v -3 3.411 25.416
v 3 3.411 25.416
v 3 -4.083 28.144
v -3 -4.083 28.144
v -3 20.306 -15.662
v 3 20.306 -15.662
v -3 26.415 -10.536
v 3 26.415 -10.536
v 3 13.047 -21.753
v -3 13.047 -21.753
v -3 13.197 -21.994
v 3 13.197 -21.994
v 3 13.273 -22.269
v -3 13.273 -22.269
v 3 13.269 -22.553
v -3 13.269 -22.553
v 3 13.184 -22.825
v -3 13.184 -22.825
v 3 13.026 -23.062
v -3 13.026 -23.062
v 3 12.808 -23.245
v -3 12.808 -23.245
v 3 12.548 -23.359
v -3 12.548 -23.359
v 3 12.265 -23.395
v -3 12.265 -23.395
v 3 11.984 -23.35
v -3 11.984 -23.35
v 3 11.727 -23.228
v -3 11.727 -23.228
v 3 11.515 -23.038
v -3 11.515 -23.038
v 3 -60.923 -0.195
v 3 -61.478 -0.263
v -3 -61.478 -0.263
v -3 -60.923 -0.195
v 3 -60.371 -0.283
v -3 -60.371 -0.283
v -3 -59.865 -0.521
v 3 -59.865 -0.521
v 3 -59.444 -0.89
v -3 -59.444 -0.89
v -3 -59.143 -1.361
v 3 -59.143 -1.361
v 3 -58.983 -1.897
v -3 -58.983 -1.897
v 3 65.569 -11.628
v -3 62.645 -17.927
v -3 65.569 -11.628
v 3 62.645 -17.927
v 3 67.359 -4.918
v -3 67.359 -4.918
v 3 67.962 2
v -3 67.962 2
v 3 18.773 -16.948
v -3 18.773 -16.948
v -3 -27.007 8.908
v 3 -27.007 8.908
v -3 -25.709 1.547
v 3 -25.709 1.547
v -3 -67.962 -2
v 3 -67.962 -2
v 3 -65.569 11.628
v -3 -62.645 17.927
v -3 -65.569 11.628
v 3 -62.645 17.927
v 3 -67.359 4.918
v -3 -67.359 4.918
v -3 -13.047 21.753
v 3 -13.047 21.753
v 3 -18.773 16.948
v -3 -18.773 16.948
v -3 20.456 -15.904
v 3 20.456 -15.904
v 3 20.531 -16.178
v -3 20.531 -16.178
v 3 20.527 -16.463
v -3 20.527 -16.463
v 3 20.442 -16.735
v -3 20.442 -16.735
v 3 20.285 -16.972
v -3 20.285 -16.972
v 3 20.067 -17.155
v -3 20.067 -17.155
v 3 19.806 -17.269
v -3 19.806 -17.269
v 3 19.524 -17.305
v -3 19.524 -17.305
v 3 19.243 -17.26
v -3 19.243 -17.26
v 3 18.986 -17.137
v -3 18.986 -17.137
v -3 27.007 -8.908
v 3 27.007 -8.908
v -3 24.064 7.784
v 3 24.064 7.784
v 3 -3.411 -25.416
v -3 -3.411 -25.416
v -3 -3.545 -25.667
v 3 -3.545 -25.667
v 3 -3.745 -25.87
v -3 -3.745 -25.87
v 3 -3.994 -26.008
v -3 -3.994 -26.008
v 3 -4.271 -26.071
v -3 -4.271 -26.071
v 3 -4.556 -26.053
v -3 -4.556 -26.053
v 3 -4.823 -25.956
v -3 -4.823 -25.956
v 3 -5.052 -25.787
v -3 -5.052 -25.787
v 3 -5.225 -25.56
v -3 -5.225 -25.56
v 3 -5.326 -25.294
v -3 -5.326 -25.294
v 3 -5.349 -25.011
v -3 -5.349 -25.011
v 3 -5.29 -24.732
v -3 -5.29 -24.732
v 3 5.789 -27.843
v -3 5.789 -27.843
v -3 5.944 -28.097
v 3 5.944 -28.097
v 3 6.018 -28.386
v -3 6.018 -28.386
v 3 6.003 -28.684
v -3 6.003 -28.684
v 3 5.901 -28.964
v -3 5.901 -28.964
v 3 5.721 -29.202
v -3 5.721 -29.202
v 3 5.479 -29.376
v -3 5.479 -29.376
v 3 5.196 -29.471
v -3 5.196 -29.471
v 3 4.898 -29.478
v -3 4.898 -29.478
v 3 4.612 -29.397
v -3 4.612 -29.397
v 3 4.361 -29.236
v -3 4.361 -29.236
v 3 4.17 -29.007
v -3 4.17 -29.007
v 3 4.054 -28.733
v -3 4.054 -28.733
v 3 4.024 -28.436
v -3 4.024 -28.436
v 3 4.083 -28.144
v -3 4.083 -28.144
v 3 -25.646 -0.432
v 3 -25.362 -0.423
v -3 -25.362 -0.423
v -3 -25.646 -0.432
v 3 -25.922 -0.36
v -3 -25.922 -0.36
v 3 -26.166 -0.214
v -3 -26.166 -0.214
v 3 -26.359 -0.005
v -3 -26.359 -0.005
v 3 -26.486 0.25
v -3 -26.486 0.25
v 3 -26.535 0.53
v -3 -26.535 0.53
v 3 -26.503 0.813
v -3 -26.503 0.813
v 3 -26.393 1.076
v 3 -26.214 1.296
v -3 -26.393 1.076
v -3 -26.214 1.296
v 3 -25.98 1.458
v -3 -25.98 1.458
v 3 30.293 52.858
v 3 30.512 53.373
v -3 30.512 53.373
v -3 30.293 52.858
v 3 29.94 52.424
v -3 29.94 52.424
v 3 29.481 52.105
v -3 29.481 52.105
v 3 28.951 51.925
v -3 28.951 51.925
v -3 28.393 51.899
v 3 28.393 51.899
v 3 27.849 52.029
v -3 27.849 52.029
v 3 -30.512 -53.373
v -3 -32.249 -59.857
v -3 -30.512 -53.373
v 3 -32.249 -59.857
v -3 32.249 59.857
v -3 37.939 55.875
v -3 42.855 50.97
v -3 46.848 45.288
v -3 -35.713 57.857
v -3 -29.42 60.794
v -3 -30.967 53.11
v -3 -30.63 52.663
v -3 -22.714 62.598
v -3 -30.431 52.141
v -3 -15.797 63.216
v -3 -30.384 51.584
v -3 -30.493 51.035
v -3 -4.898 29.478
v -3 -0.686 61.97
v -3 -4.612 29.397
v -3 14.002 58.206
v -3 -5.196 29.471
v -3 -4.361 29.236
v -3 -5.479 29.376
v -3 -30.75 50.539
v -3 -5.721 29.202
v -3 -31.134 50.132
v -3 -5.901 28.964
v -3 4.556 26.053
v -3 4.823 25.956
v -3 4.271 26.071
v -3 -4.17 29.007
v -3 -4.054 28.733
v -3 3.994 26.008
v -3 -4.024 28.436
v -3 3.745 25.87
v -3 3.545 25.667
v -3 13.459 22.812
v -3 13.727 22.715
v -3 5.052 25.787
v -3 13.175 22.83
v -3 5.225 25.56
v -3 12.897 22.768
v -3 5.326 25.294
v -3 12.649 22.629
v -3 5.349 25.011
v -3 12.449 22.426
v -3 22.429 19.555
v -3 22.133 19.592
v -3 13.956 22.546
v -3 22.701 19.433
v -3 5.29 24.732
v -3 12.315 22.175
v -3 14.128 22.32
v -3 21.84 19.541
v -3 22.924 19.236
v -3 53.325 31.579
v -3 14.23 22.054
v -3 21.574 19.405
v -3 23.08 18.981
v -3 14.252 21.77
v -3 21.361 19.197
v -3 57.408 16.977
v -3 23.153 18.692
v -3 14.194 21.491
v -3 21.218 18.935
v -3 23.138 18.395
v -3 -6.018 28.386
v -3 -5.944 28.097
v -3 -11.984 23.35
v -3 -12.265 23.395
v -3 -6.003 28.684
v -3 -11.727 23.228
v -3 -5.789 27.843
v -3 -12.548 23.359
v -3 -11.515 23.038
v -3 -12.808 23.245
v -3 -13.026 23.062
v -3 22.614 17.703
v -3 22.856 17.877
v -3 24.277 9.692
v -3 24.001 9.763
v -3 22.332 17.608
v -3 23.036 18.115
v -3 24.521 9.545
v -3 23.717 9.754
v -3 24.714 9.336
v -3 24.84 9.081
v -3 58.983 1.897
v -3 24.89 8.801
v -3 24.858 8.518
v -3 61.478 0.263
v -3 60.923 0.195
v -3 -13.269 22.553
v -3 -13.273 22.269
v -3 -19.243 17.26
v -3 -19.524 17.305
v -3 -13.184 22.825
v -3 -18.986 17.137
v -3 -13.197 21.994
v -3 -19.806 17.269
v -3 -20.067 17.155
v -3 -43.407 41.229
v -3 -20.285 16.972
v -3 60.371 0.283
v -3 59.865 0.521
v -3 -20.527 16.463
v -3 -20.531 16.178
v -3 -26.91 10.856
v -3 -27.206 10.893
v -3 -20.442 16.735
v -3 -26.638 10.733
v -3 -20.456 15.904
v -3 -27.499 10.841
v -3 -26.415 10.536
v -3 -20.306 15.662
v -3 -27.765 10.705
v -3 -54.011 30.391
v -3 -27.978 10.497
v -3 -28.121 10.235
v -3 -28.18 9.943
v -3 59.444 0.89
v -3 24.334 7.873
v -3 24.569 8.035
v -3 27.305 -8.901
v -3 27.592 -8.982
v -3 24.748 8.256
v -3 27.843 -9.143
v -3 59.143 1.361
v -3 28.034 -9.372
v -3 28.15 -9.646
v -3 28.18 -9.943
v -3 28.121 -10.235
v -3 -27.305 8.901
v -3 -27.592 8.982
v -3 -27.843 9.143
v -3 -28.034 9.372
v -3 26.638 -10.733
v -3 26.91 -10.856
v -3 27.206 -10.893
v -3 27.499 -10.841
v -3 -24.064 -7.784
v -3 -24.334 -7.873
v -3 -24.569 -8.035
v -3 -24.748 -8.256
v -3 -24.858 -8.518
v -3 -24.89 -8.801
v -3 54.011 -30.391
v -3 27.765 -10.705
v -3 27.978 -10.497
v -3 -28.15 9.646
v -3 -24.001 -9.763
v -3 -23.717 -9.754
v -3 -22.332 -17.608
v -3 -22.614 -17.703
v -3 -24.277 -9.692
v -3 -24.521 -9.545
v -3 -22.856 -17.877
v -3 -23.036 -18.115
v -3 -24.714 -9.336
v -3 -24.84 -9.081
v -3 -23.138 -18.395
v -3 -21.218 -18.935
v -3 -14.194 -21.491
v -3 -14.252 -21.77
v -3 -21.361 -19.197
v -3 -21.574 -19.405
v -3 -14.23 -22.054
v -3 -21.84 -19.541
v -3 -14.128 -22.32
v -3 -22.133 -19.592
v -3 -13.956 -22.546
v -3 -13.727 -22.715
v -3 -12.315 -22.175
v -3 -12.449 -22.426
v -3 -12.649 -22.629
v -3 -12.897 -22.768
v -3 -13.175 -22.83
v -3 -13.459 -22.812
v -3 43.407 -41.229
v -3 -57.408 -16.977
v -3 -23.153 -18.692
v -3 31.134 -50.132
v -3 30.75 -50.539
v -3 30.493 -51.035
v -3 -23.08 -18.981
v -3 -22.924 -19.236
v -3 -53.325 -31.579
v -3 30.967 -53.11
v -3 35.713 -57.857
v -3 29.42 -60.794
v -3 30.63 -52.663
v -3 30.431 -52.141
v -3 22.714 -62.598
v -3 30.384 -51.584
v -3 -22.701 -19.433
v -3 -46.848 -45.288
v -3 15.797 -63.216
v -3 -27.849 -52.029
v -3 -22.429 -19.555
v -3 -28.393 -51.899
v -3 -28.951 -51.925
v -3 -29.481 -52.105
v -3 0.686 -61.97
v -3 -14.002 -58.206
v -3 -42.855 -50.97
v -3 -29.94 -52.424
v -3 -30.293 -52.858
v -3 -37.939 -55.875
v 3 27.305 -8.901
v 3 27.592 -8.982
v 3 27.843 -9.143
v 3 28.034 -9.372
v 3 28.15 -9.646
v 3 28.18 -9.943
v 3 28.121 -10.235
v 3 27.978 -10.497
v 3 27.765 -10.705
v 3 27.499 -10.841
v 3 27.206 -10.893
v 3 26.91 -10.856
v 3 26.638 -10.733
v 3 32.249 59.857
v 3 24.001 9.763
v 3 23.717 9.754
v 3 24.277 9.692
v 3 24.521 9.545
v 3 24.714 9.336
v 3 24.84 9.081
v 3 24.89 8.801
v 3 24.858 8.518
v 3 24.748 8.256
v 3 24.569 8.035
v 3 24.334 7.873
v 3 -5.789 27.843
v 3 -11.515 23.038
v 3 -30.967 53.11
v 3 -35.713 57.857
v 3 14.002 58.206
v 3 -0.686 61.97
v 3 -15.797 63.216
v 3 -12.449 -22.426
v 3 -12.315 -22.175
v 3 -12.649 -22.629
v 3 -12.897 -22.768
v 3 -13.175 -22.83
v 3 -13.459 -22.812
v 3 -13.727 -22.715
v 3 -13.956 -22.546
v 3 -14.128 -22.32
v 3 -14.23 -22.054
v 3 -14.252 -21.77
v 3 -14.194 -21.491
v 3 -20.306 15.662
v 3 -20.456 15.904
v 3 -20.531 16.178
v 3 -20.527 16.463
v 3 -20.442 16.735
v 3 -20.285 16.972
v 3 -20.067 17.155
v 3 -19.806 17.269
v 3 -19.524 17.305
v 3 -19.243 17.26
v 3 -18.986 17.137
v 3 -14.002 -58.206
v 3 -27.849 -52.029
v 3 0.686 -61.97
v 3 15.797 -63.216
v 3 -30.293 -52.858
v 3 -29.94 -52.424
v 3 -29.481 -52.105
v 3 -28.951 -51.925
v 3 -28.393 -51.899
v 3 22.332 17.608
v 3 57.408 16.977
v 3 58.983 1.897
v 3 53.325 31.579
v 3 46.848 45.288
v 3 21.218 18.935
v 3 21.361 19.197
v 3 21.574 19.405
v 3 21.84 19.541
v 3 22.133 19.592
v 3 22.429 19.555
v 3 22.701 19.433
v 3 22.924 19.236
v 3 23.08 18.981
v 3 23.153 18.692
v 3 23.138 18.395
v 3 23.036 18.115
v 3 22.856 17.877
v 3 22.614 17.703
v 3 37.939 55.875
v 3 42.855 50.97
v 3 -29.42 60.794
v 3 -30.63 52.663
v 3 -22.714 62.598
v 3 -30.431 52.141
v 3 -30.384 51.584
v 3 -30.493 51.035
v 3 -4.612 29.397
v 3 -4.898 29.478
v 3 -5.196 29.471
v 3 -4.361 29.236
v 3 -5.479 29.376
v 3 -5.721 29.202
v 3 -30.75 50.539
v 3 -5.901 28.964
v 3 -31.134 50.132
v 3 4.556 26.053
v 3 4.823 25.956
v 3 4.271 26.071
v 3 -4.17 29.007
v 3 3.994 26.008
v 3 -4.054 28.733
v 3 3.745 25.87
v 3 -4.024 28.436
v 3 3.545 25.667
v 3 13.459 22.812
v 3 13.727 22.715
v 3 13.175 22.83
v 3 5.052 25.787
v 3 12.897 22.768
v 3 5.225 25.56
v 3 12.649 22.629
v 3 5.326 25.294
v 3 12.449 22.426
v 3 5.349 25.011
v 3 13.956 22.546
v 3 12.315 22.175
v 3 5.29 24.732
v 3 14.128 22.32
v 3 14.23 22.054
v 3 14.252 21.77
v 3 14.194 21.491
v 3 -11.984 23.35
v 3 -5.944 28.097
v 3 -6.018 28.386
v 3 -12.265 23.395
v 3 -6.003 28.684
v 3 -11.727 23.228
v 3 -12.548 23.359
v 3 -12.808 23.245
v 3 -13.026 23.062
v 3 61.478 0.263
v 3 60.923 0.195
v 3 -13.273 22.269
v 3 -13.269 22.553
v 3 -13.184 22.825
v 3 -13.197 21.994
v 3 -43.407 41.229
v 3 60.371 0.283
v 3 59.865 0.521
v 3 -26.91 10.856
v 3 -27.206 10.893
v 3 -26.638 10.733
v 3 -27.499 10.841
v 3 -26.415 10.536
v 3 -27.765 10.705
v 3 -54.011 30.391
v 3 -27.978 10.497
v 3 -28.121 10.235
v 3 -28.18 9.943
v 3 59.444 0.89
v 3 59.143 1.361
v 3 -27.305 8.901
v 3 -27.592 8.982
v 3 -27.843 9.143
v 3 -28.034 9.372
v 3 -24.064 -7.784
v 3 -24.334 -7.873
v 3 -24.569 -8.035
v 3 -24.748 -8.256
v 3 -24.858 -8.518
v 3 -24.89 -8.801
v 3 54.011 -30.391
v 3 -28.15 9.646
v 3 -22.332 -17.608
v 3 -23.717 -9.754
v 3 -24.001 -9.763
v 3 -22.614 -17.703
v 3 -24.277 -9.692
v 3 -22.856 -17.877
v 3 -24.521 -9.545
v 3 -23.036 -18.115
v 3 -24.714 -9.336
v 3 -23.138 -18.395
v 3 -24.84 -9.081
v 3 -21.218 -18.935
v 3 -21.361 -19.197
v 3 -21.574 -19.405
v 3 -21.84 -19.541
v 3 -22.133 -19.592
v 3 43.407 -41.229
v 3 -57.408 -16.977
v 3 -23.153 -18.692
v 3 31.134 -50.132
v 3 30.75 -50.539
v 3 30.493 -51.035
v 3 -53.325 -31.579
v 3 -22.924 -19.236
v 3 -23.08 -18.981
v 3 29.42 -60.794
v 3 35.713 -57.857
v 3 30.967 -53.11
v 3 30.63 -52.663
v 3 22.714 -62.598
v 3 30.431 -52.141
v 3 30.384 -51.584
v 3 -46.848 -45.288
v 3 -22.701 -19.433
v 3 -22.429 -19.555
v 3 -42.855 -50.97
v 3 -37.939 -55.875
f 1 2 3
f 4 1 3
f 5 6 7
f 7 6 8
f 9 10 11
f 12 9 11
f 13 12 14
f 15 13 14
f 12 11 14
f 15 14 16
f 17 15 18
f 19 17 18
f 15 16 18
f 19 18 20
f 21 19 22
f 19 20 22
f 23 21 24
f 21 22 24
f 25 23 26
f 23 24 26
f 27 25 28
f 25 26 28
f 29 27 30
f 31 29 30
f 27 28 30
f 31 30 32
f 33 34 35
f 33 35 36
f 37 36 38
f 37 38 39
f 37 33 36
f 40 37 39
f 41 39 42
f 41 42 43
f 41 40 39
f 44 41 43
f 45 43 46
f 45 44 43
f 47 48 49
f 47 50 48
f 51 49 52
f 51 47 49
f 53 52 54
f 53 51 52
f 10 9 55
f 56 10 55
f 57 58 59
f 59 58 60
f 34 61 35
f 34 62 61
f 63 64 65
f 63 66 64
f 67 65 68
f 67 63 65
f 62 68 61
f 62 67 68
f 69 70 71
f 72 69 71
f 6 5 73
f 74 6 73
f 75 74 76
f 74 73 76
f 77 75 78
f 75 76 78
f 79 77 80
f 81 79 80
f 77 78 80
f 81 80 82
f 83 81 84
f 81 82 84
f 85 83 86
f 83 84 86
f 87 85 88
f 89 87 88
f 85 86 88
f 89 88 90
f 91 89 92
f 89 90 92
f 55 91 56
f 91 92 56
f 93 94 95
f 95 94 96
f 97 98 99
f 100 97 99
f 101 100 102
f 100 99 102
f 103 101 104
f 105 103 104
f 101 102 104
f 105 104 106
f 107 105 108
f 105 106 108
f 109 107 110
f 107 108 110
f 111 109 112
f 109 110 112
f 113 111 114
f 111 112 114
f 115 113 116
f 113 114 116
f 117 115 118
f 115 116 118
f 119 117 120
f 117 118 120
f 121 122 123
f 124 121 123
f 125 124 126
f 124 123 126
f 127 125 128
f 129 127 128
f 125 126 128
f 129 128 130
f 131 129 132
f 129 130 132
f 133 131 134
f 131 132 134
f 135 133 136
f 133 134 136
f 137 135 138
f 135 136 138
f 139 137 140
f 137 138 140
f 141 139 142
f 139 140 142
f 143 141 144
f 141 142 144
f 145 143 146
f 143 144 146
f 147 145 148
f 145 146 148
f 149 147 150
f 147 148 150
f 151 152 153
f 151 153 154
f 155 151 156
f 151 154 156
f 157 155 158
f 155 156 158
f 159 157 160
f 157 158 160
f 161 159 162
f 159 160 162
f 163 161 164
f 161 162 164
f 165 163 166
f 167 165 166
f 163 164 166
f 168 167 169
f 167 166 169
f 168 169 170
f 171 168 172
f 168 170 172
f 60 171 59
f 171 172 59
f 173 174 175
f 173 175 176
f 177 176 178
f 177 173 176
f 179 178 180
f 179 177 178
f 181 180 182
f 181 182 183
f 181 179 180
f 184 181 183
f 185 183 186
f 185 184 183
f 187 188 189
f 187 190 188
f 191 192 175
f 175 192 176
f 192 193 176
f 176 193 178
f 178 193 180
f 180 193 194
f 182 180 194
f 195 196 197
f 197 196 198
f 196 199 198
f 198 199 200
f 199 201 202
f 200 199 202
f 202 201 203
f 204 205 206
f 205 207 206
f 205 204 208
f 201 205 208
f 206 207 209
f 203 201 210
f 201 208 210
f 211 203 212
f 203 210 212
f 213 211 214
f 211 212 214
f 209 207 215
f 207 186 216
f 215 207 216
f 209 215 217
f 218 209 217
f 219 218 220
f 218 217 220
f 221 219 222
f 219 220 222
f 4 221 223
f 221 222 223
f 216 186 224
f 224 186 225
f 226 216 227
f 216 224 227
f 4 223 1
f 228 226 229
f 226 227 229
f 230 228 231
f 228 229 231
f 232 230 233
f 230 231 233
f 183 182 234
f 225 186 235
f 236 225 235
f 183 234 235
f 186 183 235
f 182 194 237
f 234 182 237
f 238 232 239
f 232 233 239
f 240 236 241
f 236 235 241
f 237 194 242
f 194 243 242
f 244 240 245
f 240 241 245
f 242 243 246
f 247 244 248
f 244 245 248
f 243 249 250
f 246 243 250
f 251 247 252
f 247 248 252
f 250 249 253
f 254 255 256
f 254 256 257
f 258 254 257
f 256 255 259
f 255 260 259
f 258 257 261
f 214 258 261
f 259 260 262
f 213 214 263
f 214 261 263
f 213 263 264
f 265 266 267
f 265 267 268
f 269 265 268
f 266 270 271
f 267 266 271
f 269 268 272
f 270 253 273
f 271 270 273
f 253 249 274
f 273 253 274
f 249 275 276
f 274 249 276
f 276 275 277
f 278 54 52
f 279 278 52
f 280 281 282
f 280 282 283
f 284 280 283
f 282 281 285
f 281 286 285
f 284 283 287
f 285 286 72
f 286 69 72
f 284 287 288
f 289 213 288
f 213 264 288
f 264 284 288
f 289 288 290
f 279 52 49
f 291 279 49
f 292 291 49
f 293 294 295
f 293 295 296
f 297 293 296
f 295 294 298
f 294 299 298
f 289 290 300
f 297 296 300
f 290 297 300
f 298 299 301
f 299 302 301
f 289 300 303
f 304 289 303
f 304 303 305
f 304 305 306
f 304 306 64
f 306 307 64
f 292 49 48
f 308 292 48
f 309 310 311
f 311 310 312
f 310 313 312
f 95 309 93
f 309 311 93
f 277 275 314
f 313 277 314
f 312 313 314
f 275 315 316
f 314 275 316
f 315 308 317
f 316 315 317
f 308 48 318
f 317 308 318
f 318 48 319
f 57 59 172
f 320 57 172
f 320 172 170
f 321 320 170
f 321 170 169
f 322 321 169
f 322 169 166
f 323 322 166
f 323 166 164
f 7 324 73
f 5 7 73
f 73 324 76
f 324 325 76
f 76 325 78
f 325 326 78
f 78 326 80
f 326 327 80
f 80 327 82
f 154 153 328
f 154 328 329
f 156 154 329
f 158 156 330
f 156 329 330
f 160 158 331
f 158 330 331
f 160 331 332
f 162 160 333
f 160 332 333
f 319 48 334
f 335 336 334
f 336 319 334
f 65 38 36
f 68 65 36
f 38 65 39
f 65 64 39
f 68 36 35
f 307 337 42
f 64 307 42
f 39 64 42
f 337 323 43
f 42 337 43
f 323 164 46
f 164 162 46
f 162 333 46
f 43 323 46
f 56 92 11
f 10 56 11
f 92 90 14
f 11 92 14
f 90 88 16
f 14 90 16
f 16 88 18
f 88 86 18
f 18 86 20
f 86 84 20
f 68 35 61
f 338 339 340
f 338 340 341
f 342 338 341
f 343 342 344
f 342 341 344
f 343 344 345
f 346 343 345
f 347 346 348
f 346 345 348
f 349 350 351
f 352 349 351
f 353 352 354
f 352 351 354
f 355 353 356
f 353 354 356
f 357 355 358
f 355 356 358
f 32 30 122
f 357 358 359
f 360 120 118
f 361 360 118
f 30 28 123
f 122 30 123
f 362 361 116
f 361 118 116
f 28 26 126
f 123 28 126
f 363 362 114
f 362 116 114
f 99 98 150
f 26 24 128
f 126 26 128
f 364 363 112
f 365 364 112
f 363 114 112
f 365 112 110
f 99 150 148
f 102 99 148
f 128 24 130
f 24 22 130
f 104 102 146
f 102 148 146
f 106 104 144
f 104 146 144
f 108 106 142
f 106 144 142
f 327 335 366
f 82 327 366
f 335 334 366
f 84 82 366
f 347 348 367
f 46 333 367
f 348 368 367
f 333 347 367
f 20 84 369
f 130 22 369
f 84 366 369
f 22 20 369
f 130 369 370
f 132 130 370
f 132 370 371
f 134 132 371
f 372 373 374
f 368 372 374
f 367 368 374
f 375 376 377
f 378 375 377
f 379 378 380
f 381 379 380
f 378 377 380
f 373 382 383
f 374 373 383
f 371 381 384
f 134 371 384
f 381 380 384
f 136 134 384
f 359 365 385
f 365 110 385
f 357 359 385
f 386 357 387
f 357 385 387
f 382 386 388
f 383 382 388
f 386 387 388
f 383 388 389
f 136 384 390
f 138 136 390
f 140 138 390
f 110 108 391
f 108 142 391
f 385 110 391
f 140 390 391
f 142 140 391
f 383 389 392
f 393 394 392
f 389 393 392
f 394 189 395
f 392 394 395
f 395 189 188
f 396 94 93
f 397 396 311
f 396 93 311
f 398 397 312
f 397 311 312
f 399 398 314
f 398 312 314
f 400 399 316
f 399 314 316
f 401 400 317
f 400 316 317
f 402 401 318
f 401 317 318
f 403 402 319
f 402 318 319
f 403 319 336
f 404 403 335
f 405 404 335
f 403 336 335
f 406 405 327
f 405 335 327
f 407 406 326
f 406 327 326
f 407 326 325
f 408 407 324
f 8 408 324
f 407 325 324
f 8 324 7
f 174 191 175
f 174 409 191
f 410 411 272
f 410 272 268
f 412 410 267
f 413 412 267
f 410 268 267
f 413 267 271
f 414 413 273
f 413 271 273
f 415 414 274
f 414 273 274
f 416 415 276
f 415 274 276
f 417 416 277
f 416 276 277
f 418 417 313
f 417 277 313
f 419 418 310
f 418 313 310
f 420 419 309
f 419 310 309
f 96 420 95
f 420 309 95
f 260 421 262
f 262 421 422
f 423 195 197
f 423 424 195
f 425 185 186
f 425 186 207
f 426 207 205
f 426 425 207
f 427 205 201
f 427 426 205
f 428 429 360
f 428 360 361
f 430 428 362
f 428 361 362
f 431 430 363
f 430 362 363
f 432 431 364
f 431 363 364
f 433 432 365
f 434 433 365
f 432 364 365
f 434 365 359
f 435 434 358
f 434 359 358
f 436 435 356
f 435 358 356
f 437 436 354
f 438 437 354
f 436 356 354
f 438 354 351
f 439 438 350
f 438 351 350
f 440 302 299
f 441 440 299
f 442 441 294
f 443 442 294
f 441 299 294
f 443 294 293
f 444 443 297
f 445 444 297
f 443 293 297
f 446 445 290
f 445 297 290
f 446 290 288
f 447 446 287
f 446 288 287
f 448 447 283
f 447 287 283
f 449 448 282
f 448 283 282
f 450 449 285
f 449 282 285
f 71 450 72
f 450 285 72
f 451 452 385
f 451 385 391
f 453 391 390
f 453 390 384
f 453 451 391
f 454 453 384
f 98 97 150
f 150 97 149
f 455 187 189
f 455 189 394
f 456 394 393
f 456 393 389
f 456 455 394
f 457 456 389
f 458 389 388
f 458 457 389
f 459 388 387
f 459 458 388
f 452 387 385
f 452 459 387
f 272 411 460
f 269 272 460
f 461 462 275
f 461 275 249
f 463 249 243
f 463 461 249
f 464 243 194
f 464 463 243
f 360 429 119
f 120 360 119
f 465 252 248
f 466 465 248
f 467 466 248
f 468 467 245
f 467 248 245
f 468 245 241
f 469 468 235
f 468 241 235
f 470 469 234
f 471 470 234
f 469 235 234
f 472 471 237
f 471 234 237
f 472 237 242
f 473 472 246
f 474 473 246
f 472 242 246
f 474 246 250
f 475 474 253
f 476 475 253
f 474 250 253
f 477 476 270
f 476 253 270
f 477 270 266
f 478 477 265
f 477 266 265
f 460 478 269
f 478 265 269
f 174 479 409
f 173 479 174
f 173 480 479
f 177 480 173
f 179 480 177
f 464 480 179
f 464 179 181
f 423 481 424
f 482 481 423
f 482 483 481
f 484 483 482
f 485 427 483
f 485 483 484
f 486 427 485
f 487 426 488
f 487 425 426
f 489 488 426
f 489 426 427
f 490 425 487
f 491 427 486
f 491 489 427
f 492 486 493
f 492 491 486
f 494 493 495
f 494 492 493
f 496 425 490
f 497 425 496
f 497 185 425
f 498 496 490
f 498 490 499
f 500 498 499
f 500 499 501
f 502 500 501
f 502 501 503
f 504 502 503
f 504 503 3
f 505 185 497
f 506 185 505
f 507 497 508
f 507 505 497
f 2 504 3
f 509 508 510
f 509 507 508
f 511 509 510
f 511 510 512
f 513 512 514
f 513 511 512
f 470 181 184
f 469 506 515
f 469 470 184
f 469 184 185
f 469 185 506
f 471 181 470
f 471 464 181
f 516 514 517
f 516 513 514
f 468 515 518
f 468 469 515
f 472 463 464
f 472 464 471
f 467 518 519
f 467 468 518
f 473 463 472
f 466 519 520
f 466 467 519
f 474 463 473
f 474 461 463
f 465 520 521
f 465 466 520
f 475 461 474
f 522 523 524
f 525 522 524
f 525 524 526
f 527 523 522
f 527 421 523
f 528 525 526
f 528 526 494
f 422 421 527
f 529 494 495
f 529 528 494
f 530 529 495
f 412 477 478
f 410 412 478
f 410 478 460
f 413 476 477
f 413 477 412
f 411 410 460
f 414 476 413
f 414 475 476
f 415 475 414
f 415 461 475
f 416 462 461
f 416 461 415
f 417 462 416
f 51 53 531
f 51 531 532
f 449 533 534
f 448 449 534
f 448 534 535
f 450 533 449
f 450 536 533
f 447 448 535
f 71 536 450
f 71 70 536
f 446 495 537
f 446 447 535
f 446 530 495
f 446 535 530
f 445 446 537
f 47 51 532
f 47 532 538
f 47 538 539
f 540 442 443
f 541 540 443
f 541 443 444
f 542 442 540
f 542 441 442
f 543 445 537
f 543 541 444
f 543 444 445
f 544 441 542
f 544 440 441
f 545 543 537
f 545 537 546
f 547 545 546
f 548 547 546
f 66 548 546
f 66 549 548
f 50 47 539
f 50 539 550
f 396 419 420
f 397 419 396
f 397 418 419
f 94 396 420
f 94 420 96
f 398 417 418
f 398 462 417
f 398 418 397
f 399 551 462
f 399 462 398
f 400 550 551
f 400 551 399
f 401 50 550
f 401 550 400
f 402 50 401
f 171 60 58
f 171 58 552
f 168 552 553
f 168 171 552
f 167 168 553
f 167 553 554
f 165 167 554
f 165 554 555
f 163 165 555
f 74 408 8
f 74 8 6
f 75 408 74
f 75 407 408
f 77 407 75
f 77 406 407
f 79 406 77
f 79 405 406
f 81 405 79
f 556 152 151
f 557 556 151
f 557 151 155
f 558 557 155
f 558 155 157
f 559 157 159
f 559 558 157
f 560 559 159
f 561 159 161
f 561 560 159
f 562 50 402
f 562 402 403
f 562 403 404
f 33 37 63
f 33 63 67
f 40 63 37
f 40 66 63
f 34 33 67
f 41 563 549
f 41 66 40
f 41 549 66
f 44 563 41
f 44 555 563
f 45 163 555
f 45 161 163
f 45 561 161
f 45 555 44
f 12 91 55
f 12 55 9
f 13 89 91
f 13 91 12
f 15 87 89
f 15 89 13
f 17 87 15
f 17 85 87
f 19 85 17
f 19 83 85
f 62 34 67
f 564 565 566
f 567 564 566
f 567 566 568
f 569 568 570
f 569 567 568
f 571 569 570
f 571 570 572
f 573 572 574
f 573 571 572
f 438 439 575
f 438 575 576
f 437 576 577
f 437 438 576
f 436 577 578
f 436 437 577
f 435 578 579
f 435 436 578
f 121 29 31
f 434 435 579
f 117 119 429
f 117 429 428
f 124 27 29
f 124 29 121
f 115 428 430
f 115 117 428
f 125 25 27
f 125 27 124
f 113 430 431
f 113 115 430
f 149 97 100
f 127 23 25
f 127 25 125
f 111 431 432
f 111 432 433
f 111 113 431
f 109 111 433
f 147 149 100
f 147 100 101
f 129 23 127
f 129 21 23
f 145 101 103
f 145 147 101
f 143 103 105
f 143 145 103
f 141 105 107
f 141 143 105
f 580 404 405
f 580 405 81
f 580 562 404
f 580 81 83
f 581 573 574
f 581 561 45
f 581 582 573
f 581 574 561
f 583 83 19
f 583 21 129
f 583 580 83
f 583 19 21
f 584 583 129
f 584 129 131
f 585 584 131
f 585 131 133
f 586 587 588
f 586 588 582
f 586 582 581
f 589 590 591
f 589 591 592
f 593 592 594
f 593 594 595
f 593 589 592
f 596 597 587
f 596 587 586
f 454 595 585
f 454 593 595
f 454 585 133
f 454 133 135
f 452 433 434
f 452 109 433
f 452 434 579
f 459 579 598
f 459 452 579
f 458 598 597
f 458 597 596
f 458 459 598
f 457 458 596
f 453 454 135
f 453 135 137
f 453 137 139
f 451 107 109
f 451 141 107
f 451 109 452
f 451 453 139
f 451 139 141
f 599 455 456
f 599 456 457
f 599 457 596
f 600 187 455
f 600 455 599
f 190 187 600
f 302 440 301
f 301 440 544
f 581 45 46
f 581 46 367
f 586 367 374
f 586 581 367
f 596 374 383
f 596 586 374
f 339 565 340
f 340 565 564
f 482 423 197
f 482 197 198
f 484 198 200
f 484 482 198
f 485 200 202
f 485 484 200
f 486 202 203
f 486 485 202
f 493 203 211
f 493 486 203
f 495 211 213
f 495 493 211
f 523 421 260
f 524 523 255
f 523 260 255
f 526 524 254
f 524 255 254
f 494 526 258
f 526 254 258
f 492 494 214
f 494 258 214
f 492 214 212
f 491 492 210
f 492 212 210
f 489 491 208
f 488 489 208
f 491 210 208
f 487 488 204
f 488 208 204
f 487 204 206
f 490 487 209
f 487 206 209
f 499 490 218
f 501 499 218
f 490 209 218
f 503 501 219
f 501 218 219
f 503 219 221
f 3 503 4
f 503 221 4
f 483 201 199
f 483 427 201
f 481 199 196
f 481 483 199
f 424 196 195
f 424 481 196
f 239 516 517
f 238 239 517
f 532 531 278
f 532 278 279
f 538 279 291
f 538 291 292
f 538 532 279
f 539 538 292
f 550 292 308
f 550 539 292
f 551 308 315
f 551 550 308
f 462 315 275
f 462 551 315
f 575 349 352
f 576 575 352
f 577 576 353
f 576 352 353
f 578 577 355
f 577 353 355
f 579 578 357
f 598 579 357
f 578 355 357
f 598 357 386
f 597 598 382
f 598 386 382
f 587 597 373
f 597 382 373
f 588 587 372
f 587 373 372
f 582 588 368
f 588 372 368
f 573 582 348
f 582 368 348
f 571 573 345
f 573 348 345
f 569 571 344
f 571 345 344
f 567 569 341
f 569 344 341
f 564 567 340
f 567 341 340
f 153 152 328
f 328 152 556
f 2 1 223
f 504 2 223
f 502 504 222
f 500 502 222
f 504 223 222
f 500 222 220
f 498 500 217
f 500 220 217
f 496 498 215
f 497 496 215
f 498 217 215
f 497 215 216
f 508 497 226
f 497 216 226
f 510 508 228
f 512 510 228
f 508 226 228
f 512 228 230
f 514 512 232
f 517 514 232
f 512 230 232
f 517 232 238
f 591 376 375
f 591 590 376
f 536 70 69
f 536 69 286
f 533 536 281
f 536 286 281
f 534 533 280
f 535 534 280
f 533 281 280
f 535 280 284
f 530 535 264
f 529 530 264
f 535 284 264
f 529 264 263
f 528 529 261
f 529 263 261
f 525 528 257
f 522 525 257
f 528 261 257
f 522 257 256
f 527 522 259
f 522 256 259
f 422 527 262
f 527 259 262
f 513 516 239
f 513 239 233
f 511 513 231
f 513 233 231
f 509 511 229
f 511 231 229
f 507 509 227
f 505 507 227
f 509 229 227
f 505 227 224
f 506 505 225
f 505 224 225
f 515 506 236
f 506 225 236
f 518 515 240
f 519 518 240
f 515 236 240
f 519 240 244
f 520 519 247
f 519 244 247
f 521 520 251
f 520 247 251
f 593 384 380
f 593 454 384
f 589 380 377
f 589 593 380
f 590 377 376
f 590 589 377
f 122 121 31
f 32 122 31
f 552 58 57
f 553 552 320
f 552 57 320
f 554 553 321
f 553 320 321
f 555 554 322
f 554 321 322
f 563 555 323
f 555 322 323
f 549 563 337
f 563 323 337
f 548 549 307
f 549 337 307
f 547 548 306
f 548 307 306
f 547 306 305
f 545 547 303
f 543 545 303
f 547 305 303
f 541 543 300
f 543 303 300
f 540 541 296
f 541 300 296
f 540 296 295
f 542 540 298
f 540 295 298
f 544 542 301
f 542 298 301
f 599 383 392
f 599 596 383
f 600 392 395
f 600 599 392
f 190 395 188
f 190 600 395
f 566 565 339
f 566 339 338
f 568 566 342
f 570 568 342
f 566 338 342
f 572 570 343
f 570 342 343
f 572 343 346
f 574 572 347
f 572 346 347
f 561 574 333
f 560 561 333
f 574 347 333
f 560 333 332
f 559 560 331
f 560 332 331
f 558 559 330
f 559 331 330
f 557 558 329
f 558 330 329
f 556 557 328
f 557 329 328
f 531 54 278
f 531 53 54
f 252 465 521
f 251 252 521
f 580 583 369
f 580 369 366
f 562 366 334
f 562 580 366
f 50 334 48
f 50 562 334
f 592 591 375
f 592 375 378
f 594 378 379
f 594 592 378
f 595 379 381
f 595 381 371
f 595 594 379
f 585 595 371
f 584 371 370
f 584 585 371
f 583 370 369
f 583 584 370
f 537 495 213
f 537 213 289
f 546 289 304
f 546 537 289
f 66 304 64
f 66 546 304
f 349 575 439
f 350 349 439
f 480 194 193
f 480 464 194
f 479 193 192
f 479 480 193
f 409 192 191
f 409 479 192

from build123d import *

# Parameters (mm, degrees)
SKETCH1_R                = 59
EXTRUDE1_DEPTH           = 3
EXTRUDE2_DEPTH           = 3
CIRPATTERN1_COUNT        = 6
F_2_0_2_DIAMETER_HOLE1_D = 2
F_2_0_2_DIAMETER_HOLE3_D = 2
F_2_0_2_DIAMETER_HOLE4_D = 2
CIRPATTERN2_COUNT        = 6
CIRPATTERN3_COUNT        = 5
CIRPATTERN3_ANGLE        = 240


with BuildPart() as part:
    # Sketch1 → Extrude1 (new, symmetric)
    with BuildSketch(Plane(origin=(0, 0, 0), x_dir=(0, 0, -1), z_dir=(1, 0, 0))):
        Circle(SKETCH1_R)
        Polygon((28.485808967, 5.022816688), (9.893017633, 27.180842557), (-18.592791334, 22.158025869), (-28.485808967, -5.022816688), (-9.893017633, -27.180842557), (18.592791334, -22.158025869), align=None, mode=Mode.SUBTRACT)
    extrude(amount=EXTRUDE1_DEPTH, both=True)

    # Sketch2 → Extrude2 (add, symmetric)
    with BuildSketch(Plane(origin=(0, 0, 0), x_dir=(0, 0, -1), z_dir=(1, 0, 0))):
        with BuildLine():
            Line((-2, 67.961805723), (-0.262709442, 61.478149092))
            ThreePointArc((-0.262709442, 61.478149092), (-0.58620663, 59.77173183), (-2.122608272, 58.961805723))
            ThreePointArc((-2.122608272, 58.961805723), (28.679663449, 51.560419941), (51.21368579, 29.294340542))
            ThreePointArc((51.21368579, 29.294340542), (36.791707484, 48.186627241), (17.927108603, 62.644803614))
            ThreePointArc((17.927108603, 62.644803614), (8.312130826, 66.609702921), (-2, 67.961805723))
        make_face()
    extrude2 = extrude(amount=EXTRUDE2_DEPTH, both=True)

    # CirPattern1: Extrude2 ×6 about axis
    cirpattern1_axis = Axis((0, 0, 0), (1, 0, 0))
    for i in range(1, CIRPATTERN1_COUNT):
        add(extrude2.rotate(cirpattern1_axis, i * 360 / CIRPATTERN1_COUNT))

    # Ø2.0 (2) Diameter Hole1 (through all)
    with Locations(Plane(origin=(3, 0, 0), x_dir=(0, 0, -1), z_dir=(1, 0, 0))):
        with Locations((9.893017633, 27.180842557), (28.485808967, 5.022816688), (18.592791334, -22.158025869), (-9.893017633, -27.180842557), (-28.485808967, -5.022816688), (-18.592791334, 22.158025869)):
            Hole(F_2_0_2_DIAMETER_HOLE1_D / 2)

    # Ø2.0 (2) Diameter Hole3 (through all)
    with Locations(Plane(origin=(3, 0, 0), x_dir=(0, 0, -1), z_dir=(1, 0, 0))):
        with Locations((16.304877281, 19.539485786)):
            f_2_0_2_diameter_hole3 = Hole(F_2_0_2_DIAMETER_HOLE3_D / 2)

    # Ø2.0 (2) Diameter Hole4 (through all)
    with Locations(Plane(origin=(3, 0, 0), x_dir=(0, 0, -1), z_dir=(1, 0, 0))):
        with Locations((22.395343124, 12.281151237)):
            f_2_0_2_diameter_hole4 = Hole(F_2_0_2_DIAMETER_HOLE4_D / 2)

    # CirPattern2: Ø2.0 (2) Diameter Hole3 ×6 about axis
    cirpattern2_axis = Axis((0, 0, 0), (1, 0, 0))
    for i in range(1, CIRPATTERN2_COUNT):
        add(f_2_0_2_diameter_hole3.rotate(cirpattern2_axis, i * 360 / CIRPATTERN2_COUNT), mode=Mode.SUBTRACT)

    # CirPattern3: Ø2.0 (2) Diameter Hole4 ×5 about axis
    cirpattern3_axis = Axis((0, 0, 0), (-1, 0, 0))
    for i in range(1, CIRPATTERN3_COUNT):
        add(f_2_0_2_diameter_hole4.rotate(cirpattern3_axis, i * CIRPATTERN3_ANGLE / (CIRPATTERN3_COUNT - 1)), mode=Mode.SUBTRACT)


solid = part.part
